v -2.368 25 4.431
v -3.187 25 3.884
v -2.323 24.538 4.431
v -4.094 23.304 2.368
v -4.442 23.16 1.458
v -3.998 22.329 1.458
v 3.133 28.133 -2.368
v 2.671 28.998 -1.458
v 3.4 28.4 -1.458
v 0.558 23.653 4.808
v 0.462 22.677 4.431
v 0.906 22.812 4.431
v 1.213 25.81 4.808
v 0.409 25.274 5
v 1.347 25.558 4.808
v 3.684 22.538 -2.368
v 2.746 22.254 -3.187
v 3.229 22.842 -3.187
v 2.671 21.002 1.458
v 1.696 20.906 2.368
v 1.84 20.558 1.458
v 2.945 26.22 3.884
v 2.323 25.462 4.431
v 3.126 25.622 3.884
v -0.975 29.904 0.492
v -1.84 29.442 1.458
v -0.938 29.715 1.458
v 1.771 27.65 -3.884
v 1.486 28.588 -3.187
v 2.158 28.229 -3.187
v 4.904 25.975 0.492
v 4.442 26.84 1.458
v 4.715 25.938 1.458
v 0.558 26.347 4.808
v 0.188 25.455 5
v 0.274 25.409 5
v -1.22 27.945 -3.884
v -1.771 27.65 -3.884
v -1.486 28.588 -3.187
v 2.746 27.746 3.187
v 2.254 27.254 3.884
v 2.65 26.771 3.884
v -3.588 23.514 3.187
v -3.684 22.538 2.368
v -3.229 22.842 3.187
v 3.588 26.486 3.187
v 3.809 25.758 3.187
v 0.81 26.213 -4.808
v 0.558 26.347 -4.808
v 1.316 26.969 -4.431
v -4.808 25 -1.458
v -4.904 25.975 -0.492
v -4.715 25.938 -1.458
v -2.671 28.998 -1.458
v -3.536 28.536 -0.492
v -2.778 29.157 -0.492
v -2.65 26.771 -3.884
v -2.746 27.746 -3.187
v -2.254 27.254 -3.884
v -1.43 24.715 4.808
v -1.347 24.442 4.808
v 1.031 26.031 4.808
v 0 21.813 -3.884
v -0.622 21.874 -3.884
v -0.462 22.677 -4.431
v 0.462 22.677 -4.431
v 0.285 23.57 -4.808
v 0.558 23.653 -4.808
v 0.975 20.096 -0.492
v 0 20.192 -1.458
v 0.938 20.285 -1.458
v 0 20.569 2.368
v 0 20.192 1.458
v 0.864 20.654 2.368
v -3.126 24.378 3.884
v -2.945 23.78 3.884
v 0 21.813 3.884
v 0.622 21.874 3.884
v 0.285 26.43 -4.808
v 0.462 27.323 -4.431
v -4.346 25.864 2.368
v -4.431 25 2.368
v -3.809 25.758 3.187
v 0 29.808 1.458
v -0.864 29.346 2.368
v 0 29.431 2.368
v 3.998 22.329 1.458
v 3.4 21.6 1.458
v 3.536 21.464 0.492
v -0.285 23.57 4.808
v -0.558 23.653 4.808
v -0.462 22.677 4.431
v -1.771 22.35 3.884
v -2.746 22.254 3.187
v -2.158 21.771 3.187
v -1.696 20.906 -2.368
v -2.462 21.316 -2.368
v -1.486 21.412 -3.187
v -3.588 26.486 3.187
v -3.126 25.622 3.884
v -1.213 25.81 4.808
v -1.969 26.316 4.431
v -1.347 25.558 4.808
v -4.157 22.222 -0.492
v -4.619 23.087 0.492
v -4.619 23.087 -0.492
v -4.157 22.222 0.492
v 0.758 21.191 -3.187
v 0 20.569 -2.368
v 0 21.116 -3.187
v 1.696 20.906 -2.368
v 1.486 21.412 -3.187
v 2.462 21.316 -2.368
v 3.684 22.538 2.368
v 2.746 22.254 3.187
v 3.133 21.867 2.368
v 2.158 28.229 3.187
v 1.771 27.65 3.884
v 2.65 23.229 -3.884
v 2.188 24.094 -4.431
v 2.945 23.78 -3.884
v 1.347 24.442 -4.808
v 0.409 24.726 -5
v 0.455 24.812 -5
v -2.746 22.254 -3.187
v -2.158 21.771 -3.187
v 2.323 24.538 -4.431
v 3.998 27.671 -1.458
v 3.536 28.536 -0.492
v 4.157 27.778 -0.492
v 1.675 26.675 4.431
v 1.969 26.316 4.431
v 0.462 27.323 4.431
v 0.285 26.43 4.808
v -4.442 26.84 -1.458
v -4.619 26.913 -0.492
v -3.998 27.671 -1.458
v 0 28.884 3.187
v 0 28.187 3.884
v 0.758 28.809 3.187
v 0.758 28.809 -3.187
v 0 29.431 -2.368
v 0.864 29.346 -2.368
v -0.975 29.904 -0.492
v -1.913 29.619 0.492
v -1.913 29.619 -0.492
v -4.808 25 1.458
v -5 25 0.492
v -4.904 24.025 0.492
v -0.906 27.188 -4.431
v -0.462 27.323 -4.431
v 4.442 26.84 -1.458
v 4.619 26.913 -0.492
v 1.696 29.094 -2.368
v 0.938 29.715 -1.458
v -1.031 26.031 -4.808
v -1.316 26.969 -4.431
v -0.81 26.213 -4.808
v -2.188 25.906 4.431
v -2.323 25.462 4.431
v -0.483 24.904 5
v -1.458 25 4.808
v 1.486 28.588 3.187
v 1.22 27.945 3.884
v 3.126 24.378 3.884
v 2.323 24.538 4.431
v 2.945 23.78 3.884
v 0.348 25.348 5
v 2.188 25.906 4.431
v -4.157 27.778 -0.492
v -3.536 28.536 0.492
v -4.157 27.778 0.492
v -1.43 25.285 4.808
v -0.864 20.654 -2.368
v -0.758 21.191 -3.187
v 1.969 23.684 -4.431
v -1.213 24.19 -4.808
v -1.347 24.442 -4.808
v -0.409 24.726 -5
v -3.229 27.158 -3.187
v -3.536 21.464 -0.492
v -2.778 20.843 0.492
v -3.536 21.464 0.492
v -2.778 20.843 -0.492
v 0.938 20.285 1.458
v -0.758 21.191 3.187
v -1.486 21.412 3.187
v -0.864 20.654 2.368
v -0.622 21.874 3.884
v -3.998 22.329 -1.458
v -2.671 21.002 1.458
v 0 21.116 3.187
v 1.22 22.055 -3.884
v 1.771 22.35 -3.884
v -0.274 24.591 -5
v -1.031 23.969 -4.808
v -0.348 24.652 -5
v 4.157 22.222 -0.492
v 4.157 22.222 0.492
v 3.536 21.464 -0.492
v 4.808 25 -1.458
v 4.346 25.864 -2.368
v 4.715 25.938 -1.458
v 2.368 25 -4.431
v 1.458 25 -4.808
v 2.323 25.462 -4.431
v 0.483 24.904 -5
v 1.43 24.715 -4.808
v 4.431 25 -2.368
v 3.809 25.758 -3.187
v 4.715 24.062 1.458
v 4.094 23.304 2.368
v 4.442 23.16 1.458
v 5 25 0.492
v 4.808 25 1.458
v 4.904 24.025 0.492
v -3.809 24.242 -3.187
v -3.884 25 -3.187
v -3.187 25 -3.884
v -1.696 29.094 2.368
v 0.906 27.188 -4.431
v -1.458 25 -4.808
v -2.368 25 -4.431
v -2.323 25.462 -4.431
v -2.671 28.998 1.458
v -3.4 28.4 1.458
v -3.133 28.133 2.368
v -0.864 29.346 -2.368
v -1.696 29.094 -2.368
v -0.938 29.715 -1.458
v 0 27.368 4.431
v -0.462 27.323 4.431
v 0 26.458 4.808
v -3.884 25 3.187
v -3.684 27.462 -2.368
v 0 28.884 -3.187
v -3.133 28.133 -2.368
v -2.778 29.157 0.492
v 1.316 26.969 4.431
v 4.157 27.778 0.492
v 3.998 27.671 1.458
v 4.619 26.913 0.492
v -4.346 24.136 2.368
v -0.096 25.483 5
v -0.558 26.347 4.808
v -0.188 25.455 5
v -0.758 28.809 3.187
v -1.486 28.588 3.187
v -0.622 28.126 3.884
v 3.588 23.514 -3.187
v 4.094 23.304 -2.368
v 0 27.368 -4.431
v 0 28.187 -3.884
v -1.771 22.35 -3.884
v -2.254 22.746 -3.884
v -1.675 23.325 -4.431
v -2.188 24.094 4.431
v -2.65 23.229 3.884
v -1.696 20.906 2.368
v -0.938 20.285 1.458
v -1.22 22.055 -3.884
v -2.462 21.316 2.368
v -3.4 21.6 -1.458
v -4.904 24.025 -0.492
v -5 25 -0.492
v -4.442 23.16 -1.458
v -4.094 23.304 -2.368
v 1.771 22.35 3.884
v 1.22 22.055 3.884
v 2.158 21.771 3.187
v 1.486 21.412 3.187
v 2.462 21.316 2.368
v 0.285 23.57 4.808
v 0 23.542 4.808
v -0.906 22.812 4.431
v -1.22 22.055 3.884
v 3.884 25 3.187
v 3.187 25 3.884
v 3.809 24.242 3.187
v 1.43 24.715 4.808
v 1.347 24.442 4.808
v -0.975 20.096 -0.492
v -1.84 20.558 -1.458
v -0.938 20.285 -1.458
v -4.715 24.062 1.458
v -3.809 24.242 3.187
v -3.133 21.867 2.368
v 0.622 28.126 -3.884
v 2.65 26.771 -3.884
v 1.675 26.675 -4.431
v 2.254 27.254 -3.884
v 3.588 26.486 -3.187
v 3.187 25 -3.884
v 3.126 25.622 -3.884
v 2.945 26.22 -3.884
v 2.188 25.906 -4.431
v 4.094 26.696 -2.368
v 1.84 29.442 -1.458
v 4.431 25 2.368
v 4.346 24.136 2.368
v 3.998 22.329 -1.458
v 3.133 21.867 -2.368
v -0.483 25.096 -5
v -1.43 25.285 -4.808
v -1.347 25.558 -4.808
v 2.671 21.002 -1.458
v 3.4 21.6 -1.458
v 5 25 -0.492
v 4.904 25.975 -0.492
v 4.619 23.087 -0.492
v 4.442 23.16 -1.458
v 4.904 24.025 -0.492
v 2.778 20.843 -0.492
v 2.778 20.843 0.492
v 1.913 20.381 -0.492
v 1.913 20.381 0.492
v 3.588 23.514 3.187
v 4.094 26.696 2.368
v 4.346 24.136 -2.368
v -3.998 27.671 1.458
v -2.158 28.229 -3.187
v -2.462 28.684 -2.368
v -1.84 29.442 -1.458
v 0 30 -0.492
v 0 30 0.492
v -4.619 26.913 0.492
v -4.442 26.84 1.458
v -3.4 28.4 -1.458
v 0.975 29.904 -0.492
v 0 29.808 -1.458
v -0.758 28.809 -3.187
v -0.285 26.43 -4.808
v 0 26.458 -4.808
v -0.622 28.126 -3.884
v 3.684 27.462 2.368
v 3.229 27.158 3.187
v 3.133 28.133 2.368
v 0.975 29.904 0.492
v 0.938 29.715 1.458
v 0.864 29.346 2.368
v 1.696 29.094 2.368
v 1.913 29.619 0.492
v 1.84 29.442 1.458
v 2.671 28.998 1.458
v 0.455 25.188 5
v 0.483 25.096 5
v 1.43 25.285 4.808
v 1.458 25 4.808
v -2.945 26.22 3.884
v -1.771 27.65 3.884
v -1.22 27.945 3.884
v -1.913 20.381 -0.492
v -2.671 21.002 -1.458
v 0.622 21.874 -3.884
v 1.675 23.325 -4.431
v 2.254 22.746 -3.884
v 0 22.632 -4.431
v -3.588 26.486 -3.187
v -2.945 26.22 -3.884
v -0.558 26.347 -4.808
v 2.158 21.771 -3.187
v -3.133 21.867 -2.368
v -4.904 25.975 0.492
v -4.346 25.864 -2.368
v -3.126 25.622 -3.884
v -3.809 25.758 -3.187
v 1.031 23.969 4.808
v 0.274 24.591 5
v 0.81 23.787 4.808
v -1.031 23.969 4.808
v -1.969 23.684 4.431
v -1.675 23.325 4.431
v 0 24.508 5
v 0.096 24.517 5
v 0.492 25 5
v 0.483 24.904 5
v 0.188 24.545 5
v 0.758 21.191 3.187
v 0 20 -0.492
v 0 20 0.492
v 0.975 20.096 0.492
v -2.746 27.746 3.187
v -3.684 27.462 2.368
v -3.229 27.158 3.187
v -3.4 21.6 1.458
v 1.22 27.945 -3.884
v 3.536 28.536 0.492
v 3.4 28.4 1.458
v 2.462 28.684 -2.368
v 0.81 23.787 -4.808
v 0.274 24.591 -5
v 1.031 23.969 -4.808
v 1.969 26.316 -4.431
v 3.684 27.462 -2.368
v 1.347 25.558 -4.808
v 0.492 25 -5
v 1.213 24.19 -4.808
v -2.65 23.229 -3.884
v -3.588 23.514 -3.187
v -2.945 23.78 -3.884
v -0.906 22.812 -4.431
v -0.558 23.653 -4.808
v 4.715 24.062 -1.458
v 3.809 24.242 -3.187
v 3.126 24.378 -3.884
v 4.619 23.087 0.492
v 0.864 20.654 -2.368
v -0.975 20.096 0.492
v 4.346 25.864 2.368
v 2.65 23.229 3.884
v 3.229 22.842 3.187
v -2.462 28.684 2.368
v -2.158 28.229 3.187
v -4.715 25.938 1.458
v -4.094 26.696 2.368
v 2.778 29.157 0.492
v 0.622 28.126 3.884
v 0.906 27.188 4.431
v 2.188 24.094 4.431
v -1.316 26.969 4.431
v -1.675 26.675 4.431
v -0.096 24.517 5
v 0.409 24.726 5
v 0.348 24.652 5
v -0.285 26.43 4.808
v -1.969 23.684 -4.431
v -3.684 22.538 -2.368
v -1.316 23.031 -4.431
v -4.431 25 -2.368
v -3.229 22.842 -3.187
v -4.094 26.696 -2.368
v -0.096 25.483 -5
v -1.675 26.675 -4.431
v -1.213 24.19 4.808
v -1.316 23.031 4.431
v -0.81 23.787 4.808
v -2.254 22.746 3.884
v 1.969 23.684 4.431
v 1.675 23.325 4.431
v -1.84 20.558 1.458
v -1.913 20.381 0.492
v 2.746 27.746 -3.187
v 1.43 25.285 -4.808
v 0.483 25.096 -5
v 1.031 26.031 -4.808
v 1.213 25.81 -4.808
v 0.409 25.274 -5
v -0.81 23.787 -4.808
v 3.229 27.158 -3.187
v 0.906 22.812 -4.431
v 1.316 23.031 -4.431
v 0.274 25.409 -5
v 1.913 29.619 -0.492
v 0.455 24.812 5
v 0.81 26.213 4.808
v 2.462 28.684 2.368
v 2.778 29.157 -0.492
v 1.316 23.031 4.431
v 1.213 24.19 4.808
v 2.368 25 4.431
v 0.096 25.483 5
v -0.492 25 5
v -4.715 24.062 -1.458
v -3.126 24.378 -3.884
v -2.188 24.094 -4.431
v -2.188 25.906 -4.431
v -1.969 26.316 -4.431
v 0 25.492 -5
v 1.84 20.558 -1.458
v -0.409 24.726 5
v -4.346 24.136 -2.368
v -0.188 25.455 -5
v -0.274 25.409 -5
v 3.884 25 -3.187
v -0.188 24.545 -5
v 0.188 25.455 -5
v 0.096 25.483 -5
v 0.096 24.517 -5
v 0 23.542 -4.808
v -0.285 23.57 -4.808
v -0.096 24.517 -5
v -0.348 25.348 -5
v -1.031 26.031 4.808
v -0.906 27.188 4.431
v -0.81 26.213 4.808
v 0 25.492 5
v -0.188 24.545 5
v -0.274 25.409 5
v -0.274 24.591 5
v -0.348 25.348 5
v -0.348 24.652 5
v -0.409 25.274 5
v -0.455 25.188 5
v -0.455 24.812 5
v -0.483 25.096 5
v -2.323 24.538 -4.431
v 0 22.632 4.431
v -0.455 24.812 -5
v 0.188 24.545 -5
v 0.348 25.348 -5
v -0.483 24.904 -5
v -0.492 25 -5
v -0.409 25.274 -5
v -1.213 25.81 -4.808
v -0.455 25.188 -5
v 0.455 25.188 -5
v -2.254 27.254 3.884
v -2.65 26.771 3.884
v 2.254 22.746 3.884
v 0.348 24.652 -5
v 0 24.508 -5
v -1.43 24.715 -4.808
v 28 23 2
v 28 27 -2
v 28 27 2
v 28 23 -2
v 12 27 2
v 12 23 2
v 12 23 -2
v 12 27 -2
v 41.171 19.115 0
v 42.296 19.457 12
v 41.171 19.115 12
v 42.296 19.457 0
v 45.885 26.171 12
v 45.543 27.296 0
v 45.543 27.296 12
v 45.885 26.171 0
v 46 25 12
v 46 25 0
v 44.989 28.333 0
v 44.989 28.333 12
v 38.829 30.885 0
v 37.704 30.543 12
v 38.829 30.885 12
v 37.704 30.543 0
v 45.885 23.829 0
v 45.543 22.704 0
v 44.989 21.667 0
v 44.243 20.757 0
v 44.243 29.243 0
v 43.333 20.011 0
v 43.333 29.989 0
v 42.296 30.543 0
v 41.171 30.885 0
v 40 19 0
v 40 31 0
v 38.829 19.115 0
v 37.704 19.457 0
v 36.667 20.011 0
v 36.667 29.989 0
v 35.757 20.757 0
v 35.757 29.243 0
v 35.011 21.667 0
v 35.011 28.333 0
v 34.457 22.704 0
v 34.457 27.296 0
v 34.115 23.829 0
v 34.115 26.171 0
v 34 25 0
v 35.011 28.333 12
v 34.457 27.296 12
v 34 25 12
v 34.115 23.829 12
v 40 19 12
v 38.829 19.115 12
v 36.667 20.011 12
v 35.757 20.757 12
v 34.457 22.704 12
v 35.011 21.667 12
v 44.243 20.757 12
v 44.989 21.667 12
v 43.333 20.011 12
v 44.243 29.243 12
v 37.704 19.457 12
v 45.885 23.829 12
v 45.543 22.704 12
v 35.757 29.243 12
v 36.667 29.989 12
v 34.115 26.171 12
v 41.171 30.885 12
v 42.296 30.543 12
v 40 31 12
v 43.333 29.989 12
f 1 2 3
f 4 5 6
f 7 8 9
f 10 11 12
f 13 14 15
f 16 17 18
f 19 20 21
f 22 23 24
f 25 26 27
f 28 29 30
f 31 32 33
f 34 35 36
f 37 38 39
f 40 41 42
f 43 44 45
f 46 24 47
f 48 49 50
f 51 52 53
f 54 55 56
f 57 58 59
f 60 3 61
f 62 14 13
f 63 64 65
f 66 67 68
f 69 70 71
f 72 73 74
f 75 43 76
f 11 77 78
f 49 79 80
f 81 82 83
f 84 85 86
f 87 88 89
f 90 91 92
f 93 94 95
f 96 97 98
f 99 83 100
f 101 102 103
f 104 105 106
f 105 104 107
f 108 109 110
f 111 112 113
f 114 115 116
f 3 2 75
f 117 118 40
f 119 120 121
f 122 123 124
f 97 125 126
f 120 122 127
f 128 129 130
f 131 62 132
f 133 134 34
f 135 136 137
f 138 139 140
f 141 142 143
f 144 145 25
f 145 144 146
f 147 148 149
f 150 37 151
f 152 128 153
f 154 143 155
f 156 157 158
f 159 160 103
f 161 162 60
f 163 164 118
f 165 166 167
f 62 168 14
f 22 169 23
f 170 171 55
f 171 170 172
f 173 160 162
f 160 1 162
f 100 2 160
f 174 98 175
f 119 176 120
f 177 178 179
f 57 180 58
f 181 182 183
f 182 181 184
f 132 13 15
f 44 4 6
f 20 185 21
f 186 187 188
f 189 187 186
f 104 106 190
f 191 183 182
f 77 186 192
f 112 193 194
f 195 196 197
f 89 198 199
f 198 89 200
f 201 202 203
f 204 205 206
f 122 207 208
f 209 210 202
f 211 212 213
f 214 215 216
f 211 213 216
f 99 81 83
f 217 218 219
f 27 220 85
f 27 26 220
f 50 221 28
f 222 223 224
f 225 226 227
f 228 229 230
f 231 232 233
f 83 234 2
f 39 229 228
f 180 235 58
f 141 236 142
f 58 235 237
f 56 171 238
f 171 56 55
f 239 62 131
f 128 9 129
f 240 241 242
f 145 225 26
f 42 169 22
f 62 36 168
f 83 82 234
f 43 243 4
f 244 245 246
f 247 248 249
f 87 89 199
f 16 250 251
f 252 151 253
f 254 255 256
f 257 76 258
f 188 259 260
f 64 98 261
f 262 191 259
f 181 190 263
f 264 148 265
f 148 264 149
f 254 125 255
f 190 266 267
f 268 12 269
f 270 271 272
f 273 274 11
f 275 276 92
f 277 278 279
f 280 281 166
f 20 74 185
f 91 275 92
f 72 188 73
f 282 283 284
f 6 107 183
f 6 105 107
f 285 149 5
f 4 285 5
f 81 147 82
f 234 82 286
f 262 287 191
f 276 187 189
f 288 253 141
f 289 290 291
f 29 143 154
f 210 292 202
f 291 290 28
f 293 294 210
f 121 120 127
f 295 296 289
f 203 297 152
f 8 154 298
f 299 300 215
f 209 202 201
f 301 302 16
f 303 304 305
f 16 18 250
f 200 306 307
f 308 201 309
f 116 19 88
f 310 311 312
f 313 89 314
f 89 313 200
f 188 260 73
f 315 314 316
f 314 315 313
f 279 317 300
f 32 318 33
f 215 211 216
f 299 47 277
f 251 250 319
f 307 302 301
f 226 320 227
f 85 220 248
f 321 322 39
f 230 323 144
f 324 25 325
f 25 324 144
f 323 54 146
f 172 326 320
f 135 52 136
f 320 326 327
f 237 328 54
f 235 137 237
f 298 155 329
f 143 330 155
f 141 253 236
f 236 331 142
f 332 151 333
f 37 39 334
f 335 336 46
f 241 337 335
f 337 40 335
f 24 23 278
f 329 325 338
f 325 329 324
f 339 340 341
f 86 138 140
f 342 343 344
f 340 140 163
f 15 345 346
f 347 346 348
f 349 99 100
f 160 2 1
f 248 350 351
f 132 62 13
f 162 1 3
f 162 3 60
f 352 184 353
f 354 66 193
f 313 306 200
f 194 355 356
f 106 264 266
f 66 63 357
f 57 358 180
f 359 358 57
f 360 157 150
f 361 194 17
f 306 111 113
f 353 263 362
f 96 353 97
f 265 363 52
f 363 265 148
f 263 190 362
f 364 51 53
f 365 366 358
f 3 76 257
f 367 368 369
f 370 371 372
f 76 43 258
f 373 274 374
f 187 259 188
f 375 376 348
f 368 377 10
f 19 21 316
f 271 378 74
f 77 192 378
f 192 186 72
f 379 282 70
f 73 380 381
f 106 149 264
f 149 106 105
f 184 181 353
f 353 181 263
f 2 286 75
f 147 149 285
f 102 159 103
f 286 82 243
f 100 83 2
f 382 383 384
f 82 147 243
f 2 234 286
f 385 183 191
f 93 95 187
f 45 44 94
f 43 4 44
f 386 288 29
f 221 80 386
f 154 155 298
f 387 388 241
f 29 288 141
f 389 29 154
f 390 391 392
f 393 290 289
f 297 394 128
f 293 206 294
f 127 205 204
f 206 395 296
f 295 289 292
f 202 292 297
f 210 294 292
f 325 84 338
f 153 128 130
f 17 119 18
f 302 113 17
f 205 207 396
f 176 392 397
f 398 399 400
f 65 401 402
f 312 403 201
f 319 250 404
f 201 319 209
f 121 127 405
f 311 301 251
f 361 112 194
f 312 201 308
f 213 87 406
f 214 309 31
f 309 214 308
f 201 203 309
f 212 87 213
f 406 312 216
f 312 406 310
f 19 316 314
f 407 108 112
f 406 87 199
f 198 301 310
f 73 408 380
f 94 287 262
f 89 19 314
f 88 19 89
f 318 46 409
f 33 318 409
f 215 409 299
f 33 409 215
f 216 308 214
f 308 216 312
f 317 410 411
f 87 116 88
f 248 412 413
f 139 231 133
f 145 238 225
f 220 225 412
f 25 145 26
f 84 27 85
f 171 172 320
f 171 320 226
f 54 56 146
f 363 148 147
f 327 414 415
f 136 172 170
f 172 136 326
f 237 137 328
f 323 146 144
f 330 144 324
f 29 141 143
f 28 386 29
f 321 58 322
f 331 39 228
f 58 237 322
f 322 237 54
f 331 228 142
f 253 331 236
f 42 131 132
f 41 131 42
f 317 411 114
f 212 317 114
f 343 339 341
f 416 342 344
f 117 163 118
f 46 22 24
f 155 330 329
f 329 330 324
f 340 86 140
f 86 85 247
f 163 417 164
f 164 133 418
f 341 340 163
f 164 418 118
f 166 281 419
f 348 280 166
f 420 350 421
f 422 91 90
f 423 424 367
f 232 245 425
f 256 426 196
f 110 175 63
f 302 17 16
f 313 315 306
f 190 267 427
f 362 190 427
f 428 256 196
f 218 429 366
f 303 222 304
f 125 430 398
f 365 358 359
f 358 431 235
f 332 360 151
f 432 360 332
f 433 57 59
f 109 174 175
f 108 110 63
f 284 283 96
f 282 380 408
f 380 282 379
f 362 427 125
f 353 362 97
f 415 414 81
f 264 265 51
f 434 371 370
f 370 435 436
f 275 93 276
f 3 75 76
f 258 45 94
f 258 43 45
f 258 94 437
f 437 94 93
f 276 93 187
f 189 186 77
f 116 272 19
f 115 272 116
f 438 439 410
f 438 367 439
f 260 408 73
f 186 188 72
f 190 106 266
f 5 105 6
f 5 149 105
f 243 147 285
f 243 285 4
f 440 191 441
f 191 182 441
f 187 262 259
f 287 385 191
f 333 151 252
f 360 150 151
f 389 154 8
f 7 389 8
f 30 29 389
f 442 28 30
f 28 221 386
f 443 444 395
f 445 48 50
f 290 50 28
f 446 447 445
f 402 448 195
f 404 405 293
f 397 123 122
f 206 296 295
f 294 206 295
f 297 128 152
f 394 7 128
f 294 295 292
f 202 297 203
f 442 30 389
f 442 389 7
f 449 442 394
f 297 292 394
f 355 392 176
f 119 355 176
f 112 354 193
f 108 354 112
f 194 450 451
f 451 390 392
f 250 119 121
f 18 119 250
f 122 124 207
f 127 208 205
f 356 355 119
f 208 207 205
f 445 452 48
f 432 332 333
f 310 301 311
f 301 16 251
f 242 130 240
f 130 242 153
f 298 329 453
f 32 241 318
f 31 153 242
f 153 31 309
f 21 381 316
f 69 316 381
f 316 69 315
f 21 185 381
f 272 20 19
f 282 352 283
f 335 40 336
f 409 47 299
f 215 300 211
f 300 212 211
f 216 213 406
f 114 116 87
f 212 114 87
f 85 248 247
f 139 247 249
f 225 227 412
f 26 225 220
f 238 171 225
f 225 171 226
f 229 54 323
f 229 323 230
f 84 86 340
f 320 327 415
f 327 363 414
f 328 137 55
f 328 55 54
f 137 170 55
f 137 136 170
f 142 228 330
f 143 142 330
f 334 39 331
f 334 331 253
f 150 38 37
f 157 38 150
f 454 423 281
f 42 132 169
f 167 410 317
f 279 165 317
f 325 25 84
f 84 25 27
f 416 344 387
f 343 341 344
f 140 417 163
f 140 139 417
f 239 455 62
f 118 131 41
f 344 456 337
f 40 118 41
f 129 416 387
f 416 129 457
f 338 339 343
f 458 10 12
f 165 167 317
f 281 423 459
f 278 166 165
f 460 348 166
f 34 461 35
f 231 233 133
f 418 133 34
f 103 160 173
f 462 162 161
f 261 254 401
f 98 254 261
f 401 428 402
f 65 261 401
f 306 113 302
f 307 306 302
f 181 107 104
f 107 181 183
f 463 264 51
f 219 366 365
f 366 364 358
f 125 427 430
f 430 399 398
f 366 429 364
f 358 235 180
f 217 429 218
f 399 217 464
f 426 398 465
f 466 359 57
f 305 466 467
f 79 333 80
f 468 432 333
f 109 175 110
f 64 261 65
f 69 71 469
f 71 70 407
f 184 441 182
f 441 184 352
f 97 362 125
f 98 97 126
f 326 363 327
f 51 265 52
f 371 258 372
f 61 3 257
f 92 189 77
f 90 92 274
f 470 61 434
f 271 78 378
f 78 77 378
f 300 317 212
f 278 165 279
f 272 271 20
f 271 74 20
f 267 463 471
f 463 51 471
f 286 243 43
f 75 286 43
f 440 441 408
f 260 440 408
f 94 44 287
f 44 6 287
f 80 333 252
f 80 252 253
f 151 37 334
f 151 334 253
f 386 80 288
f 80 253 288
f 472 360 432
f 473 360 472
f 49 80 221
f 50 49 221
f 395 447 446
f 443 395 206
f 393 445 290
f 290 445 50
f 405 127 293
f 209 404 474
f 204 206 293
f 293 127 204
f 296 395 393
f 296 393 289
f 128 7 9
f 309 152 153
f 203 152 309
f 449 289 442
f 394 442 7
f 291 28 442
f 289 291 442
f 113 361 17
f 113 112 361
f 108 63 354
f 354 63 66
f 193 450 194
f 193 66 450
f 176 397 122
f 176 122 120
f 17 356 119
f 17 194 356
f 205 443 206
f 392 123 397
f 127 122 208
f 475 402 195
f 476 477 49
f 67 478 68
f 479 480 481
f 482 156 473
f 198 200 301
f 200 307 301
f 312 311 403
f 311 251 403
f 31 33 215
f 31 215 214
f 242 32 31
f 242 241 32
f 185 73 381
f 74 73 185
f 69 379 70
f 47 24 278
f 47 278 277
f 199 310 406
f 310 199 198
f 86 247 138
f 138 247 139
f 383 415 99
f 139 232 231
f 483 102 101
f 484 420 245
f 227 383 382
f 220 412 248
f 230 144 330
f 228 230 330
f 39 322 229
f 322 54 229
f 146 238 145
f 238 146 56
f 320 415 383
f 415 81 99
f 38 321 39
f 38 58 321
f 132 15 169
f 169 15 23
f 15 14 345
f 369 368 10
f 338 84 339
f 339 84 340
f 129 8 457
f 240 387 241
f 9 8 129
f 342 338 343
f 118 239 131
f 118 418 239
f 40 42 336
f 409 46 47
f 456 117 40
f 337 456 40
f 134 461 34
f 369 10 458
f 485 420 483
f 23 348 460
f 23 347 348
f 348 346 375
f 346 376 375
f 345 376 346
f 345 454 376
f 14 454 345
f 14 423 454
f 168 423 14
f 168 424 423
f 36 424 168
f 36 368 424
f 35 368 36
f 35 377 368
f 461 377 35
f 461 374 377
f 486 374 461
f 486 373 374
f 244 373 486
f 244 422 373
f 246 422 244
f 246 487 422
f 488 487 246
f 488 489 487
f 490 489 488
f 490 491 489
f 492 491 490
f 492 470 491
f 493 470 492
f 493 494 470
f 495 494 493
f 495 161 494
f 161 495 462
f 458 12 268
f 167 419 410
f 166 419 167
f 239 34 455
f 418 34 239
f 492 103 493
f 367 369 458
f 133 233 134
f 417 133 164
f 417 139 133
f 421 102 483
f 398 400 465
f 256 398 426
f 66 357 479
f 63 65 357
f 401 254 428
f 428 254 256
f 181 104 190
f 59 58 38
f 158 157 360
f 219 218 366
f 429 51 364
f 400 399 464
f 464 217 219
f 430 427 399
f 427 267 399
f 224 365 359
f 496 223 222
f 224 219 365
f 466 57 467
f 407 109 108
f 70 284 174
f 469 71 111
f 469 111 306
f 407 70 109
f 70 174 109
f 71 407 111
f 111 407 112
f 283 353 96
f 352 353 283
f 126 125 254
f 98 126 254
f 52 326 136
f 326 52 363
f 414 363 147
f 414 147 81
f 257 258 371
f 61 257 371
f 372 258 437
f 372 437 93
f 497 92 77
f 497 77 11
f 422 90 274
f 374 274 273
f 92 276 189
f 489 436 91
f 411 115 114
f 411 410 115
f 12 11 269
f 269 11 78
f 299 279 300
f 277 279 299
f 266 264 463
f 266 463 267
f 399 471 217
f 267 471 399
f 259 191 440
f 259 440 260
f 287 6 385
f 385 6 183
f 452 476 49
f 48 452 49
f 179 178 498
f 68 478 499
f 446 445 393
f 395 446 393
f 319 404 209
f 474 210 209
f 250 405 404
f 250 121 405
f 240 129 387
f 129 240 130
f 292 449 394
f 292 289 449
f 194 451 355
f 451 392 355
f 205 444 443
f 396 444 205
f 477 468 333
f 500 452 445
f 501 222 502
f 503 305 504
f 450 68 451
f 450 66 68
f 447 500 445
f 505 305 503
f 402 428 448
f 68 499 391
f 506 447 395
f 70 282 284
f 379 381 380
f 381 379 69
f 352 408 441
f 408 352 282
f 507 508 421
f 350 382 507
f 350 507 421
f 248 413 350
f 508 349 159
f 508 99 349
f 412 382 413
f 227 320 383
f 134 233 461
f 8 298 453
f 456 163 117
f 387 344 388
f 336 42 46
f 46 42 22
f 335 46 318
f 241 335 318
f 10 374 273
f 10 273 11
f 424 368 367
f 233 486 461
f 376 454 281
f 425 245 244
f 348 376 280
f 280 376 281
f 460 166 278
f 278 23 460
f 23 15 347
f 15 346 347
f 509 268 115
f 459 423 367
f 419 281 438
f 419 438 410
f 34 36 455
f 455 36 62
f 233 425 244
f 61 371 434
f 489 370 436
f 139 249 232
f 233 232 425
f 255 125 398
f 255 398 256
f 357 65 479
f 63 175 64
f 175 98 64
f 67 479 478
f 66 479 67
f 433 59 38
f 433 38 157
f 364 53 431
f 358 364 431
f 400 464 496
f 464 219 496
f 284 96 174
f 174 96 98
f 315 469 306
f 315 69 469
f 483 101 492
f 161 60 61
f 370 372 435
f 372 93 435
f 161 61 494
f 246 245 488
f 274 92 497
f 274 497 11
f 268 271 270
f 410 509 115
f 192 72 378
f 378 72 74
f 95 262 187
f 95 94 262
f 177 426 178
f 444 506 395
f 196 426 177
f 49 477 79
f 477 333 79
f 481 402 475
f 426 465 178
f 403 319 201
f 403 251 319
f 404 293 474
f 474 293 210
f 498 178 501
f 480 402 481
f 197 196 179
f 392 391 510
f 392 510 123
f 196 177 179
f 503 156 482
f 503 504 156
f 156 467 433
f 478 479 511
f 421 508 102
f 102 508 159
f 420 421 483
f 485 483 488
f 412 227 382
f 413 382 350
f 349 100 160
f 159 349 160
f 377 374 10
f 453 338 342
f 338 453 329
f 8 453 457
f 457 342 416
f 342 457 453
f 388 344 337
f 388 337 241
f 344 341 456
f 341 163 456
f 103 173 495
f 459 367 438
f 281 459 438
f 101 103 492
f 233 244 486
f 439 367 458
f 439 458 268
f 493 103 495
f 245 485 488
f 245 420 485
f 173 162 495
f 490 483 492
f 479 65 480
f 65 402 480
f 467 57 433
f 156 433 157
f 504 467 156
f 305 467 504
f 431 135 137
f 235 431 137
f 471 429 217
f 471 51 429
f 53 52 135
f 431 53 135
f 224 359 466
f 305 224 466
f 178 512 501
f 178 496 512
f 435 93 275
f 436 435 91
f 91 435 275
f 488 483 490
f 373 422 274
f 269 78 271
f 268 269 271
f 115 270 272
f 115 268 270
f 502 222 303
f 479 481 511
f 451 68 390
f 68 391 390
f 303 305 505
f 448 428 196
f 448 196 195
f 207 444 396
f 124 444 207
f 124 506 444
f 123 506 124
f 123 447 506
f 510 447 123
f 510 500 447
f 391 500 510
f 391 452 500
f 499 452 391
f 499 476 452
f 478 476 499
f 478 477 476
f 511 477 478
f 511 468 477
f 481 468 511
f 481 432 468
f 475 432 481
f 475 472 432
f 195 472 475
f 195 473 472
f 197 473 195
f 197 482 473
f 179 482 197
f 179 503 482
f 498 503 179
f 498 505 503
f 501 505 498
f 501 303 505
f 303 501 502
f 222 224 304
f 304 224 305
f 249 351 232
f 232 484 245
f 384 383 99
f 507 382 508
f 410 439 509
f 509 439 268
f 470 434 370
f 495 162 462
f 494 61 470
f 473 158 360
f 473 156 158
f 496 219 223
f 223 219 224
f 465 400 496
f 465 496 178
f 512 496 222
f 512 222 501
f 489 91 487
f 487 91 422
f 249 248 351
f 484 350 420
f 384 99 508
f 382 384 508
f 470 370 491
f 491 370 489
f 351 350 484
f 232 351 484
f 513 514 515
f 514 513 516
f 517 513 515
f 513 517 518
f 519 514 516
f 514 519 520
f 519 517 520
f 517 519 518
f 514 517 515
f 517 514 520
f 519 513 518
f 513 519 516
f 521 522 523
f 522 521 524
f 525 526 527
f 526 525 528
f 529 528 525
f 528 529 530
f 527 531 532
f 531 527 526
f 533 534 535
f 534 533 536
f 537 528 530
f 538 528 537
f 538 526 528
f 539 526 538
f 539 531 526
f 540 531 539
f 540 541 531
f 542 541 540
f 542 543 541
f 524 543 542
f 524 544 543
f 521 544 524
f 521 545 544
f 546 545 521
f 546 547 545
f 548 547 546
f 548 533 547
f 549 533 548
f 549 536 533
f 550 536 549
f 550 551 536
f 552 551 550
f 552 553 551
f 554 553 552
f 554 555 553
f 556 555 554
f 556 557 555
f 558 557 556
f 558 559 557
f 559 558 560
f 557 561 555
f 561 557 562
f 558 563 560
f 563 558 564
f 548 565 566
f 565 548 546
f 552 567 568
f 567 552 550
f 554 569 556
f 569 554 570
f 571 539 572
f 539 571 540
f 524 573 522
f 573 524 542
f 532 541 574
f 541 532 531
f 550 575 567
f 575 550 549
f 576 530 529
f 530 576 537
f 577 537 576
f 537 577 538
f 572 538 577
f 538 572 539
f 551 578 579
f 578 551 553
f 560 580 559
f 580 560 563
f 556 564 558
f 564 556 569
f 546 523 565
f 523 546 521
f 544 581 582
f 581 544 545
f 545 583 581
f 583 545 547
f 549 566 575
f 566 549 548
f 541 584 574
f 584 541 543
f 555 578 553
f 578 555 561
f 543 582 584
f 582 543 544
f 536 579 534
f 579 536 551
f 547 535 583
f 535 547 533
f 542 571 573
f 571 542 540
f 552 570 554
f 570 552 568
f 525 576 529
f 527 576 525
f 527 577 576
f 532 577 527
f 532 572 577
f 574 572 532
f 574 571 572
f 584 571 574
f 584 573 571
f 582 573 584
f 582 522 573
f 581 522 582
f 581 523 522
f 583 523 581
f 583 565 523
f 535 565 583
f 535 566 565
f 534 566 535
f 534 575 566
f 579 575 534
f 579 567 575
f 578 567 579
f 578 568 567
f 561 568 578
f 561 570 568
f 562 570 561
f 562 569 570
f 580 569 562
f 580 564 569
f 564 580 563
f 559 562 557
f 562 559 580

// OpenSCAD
// Tier F visual test — v3 Phase 3: polyhedron(), resize(), nested extrusion
// Open in ChiselCAD (and optionally OpenSCAD) to compare results.

// --- Scene 1: polyhedron() — a tetrahedron (all-triangle faces)
translate([0, 0, 0])
    polyhedron(
        points = [[0,0,0], [10,0,0], [5,10,0], [5,5,10]],
        faces  = [[0,1,2], [0,1,3], [1,2,3], [0,2,3]]
    );

// --- Scene 2: polyhedron() — a square pyramid (one quad face, fan-triangulated)
translate([20, 0, 0])
    polyhedron(
        points = [[0,0,0], [8,0,0], [8,8,0], [0,8,0], [4,4,8]],
        faces  = [[0,1,2,3], [0,1,4], [1,2,4], [2,3,4], [3,0,4]]
    );

// --- Scene 3: polyhedron() — a hand-built cube (six quad faces)
translate([40, 0, 0])
    polyhedron(
        points = [
            [0,0,0], [6,0,0], [6,6,0], [0,6,0],
            [0,0,6], [6,0,6], [6,6,6], [0,6,6]
        ],
        faces = [
            [0,1,2,3], // bottom
            [4,5,6,7], // top
            [0,1,5,4], // front
            [1,2,6,5], // right
            [2,3,7,6], // back
            [3,0,4,7]  // left
        ]
    );

// --- Scene 4: resize() — uniform newsize on a sphere
translate([0, 25, 0])
    resize([10, 10, 10])
        sphere(r = 2, $fn = 32);

// --- Scene 5: resize() — stretch only the x axis (y/z stay at 0 = unchanged)
translate([20, 25, 0])
    resize([16, 0, 0])
        cube([4, 4, 4], center = true);

// --- Scene 6: resize() — auto= proportionally scales the zeroed axis
translate([40, 25, 0])
    resize([12, 0, 0], auto = true)
        cylinder(h = 4, r = 2, $fn = 32);

// --- Scene 7: nested linear_extrude — outer extrude re-extrudes the
// silhouette of a fully realized inner extrusion
translate([0, 50, 0])
    linear_extrude(height = 6)
        linear_extrude(height = 3)
            square([6, 6]);

// --- Scene 8: nested extrusion mixing kinds — linear_extrude wrapping a
// rotate_extrude (torus silhouette re-extruded into a flat-topped solid)
translate([25, 50, 0])
    linear_extrude(height = 4)
        rotate_extrude($fn = 32)
            translate([5, 0, 0])
                circle(r = 2, $fn = 24);
